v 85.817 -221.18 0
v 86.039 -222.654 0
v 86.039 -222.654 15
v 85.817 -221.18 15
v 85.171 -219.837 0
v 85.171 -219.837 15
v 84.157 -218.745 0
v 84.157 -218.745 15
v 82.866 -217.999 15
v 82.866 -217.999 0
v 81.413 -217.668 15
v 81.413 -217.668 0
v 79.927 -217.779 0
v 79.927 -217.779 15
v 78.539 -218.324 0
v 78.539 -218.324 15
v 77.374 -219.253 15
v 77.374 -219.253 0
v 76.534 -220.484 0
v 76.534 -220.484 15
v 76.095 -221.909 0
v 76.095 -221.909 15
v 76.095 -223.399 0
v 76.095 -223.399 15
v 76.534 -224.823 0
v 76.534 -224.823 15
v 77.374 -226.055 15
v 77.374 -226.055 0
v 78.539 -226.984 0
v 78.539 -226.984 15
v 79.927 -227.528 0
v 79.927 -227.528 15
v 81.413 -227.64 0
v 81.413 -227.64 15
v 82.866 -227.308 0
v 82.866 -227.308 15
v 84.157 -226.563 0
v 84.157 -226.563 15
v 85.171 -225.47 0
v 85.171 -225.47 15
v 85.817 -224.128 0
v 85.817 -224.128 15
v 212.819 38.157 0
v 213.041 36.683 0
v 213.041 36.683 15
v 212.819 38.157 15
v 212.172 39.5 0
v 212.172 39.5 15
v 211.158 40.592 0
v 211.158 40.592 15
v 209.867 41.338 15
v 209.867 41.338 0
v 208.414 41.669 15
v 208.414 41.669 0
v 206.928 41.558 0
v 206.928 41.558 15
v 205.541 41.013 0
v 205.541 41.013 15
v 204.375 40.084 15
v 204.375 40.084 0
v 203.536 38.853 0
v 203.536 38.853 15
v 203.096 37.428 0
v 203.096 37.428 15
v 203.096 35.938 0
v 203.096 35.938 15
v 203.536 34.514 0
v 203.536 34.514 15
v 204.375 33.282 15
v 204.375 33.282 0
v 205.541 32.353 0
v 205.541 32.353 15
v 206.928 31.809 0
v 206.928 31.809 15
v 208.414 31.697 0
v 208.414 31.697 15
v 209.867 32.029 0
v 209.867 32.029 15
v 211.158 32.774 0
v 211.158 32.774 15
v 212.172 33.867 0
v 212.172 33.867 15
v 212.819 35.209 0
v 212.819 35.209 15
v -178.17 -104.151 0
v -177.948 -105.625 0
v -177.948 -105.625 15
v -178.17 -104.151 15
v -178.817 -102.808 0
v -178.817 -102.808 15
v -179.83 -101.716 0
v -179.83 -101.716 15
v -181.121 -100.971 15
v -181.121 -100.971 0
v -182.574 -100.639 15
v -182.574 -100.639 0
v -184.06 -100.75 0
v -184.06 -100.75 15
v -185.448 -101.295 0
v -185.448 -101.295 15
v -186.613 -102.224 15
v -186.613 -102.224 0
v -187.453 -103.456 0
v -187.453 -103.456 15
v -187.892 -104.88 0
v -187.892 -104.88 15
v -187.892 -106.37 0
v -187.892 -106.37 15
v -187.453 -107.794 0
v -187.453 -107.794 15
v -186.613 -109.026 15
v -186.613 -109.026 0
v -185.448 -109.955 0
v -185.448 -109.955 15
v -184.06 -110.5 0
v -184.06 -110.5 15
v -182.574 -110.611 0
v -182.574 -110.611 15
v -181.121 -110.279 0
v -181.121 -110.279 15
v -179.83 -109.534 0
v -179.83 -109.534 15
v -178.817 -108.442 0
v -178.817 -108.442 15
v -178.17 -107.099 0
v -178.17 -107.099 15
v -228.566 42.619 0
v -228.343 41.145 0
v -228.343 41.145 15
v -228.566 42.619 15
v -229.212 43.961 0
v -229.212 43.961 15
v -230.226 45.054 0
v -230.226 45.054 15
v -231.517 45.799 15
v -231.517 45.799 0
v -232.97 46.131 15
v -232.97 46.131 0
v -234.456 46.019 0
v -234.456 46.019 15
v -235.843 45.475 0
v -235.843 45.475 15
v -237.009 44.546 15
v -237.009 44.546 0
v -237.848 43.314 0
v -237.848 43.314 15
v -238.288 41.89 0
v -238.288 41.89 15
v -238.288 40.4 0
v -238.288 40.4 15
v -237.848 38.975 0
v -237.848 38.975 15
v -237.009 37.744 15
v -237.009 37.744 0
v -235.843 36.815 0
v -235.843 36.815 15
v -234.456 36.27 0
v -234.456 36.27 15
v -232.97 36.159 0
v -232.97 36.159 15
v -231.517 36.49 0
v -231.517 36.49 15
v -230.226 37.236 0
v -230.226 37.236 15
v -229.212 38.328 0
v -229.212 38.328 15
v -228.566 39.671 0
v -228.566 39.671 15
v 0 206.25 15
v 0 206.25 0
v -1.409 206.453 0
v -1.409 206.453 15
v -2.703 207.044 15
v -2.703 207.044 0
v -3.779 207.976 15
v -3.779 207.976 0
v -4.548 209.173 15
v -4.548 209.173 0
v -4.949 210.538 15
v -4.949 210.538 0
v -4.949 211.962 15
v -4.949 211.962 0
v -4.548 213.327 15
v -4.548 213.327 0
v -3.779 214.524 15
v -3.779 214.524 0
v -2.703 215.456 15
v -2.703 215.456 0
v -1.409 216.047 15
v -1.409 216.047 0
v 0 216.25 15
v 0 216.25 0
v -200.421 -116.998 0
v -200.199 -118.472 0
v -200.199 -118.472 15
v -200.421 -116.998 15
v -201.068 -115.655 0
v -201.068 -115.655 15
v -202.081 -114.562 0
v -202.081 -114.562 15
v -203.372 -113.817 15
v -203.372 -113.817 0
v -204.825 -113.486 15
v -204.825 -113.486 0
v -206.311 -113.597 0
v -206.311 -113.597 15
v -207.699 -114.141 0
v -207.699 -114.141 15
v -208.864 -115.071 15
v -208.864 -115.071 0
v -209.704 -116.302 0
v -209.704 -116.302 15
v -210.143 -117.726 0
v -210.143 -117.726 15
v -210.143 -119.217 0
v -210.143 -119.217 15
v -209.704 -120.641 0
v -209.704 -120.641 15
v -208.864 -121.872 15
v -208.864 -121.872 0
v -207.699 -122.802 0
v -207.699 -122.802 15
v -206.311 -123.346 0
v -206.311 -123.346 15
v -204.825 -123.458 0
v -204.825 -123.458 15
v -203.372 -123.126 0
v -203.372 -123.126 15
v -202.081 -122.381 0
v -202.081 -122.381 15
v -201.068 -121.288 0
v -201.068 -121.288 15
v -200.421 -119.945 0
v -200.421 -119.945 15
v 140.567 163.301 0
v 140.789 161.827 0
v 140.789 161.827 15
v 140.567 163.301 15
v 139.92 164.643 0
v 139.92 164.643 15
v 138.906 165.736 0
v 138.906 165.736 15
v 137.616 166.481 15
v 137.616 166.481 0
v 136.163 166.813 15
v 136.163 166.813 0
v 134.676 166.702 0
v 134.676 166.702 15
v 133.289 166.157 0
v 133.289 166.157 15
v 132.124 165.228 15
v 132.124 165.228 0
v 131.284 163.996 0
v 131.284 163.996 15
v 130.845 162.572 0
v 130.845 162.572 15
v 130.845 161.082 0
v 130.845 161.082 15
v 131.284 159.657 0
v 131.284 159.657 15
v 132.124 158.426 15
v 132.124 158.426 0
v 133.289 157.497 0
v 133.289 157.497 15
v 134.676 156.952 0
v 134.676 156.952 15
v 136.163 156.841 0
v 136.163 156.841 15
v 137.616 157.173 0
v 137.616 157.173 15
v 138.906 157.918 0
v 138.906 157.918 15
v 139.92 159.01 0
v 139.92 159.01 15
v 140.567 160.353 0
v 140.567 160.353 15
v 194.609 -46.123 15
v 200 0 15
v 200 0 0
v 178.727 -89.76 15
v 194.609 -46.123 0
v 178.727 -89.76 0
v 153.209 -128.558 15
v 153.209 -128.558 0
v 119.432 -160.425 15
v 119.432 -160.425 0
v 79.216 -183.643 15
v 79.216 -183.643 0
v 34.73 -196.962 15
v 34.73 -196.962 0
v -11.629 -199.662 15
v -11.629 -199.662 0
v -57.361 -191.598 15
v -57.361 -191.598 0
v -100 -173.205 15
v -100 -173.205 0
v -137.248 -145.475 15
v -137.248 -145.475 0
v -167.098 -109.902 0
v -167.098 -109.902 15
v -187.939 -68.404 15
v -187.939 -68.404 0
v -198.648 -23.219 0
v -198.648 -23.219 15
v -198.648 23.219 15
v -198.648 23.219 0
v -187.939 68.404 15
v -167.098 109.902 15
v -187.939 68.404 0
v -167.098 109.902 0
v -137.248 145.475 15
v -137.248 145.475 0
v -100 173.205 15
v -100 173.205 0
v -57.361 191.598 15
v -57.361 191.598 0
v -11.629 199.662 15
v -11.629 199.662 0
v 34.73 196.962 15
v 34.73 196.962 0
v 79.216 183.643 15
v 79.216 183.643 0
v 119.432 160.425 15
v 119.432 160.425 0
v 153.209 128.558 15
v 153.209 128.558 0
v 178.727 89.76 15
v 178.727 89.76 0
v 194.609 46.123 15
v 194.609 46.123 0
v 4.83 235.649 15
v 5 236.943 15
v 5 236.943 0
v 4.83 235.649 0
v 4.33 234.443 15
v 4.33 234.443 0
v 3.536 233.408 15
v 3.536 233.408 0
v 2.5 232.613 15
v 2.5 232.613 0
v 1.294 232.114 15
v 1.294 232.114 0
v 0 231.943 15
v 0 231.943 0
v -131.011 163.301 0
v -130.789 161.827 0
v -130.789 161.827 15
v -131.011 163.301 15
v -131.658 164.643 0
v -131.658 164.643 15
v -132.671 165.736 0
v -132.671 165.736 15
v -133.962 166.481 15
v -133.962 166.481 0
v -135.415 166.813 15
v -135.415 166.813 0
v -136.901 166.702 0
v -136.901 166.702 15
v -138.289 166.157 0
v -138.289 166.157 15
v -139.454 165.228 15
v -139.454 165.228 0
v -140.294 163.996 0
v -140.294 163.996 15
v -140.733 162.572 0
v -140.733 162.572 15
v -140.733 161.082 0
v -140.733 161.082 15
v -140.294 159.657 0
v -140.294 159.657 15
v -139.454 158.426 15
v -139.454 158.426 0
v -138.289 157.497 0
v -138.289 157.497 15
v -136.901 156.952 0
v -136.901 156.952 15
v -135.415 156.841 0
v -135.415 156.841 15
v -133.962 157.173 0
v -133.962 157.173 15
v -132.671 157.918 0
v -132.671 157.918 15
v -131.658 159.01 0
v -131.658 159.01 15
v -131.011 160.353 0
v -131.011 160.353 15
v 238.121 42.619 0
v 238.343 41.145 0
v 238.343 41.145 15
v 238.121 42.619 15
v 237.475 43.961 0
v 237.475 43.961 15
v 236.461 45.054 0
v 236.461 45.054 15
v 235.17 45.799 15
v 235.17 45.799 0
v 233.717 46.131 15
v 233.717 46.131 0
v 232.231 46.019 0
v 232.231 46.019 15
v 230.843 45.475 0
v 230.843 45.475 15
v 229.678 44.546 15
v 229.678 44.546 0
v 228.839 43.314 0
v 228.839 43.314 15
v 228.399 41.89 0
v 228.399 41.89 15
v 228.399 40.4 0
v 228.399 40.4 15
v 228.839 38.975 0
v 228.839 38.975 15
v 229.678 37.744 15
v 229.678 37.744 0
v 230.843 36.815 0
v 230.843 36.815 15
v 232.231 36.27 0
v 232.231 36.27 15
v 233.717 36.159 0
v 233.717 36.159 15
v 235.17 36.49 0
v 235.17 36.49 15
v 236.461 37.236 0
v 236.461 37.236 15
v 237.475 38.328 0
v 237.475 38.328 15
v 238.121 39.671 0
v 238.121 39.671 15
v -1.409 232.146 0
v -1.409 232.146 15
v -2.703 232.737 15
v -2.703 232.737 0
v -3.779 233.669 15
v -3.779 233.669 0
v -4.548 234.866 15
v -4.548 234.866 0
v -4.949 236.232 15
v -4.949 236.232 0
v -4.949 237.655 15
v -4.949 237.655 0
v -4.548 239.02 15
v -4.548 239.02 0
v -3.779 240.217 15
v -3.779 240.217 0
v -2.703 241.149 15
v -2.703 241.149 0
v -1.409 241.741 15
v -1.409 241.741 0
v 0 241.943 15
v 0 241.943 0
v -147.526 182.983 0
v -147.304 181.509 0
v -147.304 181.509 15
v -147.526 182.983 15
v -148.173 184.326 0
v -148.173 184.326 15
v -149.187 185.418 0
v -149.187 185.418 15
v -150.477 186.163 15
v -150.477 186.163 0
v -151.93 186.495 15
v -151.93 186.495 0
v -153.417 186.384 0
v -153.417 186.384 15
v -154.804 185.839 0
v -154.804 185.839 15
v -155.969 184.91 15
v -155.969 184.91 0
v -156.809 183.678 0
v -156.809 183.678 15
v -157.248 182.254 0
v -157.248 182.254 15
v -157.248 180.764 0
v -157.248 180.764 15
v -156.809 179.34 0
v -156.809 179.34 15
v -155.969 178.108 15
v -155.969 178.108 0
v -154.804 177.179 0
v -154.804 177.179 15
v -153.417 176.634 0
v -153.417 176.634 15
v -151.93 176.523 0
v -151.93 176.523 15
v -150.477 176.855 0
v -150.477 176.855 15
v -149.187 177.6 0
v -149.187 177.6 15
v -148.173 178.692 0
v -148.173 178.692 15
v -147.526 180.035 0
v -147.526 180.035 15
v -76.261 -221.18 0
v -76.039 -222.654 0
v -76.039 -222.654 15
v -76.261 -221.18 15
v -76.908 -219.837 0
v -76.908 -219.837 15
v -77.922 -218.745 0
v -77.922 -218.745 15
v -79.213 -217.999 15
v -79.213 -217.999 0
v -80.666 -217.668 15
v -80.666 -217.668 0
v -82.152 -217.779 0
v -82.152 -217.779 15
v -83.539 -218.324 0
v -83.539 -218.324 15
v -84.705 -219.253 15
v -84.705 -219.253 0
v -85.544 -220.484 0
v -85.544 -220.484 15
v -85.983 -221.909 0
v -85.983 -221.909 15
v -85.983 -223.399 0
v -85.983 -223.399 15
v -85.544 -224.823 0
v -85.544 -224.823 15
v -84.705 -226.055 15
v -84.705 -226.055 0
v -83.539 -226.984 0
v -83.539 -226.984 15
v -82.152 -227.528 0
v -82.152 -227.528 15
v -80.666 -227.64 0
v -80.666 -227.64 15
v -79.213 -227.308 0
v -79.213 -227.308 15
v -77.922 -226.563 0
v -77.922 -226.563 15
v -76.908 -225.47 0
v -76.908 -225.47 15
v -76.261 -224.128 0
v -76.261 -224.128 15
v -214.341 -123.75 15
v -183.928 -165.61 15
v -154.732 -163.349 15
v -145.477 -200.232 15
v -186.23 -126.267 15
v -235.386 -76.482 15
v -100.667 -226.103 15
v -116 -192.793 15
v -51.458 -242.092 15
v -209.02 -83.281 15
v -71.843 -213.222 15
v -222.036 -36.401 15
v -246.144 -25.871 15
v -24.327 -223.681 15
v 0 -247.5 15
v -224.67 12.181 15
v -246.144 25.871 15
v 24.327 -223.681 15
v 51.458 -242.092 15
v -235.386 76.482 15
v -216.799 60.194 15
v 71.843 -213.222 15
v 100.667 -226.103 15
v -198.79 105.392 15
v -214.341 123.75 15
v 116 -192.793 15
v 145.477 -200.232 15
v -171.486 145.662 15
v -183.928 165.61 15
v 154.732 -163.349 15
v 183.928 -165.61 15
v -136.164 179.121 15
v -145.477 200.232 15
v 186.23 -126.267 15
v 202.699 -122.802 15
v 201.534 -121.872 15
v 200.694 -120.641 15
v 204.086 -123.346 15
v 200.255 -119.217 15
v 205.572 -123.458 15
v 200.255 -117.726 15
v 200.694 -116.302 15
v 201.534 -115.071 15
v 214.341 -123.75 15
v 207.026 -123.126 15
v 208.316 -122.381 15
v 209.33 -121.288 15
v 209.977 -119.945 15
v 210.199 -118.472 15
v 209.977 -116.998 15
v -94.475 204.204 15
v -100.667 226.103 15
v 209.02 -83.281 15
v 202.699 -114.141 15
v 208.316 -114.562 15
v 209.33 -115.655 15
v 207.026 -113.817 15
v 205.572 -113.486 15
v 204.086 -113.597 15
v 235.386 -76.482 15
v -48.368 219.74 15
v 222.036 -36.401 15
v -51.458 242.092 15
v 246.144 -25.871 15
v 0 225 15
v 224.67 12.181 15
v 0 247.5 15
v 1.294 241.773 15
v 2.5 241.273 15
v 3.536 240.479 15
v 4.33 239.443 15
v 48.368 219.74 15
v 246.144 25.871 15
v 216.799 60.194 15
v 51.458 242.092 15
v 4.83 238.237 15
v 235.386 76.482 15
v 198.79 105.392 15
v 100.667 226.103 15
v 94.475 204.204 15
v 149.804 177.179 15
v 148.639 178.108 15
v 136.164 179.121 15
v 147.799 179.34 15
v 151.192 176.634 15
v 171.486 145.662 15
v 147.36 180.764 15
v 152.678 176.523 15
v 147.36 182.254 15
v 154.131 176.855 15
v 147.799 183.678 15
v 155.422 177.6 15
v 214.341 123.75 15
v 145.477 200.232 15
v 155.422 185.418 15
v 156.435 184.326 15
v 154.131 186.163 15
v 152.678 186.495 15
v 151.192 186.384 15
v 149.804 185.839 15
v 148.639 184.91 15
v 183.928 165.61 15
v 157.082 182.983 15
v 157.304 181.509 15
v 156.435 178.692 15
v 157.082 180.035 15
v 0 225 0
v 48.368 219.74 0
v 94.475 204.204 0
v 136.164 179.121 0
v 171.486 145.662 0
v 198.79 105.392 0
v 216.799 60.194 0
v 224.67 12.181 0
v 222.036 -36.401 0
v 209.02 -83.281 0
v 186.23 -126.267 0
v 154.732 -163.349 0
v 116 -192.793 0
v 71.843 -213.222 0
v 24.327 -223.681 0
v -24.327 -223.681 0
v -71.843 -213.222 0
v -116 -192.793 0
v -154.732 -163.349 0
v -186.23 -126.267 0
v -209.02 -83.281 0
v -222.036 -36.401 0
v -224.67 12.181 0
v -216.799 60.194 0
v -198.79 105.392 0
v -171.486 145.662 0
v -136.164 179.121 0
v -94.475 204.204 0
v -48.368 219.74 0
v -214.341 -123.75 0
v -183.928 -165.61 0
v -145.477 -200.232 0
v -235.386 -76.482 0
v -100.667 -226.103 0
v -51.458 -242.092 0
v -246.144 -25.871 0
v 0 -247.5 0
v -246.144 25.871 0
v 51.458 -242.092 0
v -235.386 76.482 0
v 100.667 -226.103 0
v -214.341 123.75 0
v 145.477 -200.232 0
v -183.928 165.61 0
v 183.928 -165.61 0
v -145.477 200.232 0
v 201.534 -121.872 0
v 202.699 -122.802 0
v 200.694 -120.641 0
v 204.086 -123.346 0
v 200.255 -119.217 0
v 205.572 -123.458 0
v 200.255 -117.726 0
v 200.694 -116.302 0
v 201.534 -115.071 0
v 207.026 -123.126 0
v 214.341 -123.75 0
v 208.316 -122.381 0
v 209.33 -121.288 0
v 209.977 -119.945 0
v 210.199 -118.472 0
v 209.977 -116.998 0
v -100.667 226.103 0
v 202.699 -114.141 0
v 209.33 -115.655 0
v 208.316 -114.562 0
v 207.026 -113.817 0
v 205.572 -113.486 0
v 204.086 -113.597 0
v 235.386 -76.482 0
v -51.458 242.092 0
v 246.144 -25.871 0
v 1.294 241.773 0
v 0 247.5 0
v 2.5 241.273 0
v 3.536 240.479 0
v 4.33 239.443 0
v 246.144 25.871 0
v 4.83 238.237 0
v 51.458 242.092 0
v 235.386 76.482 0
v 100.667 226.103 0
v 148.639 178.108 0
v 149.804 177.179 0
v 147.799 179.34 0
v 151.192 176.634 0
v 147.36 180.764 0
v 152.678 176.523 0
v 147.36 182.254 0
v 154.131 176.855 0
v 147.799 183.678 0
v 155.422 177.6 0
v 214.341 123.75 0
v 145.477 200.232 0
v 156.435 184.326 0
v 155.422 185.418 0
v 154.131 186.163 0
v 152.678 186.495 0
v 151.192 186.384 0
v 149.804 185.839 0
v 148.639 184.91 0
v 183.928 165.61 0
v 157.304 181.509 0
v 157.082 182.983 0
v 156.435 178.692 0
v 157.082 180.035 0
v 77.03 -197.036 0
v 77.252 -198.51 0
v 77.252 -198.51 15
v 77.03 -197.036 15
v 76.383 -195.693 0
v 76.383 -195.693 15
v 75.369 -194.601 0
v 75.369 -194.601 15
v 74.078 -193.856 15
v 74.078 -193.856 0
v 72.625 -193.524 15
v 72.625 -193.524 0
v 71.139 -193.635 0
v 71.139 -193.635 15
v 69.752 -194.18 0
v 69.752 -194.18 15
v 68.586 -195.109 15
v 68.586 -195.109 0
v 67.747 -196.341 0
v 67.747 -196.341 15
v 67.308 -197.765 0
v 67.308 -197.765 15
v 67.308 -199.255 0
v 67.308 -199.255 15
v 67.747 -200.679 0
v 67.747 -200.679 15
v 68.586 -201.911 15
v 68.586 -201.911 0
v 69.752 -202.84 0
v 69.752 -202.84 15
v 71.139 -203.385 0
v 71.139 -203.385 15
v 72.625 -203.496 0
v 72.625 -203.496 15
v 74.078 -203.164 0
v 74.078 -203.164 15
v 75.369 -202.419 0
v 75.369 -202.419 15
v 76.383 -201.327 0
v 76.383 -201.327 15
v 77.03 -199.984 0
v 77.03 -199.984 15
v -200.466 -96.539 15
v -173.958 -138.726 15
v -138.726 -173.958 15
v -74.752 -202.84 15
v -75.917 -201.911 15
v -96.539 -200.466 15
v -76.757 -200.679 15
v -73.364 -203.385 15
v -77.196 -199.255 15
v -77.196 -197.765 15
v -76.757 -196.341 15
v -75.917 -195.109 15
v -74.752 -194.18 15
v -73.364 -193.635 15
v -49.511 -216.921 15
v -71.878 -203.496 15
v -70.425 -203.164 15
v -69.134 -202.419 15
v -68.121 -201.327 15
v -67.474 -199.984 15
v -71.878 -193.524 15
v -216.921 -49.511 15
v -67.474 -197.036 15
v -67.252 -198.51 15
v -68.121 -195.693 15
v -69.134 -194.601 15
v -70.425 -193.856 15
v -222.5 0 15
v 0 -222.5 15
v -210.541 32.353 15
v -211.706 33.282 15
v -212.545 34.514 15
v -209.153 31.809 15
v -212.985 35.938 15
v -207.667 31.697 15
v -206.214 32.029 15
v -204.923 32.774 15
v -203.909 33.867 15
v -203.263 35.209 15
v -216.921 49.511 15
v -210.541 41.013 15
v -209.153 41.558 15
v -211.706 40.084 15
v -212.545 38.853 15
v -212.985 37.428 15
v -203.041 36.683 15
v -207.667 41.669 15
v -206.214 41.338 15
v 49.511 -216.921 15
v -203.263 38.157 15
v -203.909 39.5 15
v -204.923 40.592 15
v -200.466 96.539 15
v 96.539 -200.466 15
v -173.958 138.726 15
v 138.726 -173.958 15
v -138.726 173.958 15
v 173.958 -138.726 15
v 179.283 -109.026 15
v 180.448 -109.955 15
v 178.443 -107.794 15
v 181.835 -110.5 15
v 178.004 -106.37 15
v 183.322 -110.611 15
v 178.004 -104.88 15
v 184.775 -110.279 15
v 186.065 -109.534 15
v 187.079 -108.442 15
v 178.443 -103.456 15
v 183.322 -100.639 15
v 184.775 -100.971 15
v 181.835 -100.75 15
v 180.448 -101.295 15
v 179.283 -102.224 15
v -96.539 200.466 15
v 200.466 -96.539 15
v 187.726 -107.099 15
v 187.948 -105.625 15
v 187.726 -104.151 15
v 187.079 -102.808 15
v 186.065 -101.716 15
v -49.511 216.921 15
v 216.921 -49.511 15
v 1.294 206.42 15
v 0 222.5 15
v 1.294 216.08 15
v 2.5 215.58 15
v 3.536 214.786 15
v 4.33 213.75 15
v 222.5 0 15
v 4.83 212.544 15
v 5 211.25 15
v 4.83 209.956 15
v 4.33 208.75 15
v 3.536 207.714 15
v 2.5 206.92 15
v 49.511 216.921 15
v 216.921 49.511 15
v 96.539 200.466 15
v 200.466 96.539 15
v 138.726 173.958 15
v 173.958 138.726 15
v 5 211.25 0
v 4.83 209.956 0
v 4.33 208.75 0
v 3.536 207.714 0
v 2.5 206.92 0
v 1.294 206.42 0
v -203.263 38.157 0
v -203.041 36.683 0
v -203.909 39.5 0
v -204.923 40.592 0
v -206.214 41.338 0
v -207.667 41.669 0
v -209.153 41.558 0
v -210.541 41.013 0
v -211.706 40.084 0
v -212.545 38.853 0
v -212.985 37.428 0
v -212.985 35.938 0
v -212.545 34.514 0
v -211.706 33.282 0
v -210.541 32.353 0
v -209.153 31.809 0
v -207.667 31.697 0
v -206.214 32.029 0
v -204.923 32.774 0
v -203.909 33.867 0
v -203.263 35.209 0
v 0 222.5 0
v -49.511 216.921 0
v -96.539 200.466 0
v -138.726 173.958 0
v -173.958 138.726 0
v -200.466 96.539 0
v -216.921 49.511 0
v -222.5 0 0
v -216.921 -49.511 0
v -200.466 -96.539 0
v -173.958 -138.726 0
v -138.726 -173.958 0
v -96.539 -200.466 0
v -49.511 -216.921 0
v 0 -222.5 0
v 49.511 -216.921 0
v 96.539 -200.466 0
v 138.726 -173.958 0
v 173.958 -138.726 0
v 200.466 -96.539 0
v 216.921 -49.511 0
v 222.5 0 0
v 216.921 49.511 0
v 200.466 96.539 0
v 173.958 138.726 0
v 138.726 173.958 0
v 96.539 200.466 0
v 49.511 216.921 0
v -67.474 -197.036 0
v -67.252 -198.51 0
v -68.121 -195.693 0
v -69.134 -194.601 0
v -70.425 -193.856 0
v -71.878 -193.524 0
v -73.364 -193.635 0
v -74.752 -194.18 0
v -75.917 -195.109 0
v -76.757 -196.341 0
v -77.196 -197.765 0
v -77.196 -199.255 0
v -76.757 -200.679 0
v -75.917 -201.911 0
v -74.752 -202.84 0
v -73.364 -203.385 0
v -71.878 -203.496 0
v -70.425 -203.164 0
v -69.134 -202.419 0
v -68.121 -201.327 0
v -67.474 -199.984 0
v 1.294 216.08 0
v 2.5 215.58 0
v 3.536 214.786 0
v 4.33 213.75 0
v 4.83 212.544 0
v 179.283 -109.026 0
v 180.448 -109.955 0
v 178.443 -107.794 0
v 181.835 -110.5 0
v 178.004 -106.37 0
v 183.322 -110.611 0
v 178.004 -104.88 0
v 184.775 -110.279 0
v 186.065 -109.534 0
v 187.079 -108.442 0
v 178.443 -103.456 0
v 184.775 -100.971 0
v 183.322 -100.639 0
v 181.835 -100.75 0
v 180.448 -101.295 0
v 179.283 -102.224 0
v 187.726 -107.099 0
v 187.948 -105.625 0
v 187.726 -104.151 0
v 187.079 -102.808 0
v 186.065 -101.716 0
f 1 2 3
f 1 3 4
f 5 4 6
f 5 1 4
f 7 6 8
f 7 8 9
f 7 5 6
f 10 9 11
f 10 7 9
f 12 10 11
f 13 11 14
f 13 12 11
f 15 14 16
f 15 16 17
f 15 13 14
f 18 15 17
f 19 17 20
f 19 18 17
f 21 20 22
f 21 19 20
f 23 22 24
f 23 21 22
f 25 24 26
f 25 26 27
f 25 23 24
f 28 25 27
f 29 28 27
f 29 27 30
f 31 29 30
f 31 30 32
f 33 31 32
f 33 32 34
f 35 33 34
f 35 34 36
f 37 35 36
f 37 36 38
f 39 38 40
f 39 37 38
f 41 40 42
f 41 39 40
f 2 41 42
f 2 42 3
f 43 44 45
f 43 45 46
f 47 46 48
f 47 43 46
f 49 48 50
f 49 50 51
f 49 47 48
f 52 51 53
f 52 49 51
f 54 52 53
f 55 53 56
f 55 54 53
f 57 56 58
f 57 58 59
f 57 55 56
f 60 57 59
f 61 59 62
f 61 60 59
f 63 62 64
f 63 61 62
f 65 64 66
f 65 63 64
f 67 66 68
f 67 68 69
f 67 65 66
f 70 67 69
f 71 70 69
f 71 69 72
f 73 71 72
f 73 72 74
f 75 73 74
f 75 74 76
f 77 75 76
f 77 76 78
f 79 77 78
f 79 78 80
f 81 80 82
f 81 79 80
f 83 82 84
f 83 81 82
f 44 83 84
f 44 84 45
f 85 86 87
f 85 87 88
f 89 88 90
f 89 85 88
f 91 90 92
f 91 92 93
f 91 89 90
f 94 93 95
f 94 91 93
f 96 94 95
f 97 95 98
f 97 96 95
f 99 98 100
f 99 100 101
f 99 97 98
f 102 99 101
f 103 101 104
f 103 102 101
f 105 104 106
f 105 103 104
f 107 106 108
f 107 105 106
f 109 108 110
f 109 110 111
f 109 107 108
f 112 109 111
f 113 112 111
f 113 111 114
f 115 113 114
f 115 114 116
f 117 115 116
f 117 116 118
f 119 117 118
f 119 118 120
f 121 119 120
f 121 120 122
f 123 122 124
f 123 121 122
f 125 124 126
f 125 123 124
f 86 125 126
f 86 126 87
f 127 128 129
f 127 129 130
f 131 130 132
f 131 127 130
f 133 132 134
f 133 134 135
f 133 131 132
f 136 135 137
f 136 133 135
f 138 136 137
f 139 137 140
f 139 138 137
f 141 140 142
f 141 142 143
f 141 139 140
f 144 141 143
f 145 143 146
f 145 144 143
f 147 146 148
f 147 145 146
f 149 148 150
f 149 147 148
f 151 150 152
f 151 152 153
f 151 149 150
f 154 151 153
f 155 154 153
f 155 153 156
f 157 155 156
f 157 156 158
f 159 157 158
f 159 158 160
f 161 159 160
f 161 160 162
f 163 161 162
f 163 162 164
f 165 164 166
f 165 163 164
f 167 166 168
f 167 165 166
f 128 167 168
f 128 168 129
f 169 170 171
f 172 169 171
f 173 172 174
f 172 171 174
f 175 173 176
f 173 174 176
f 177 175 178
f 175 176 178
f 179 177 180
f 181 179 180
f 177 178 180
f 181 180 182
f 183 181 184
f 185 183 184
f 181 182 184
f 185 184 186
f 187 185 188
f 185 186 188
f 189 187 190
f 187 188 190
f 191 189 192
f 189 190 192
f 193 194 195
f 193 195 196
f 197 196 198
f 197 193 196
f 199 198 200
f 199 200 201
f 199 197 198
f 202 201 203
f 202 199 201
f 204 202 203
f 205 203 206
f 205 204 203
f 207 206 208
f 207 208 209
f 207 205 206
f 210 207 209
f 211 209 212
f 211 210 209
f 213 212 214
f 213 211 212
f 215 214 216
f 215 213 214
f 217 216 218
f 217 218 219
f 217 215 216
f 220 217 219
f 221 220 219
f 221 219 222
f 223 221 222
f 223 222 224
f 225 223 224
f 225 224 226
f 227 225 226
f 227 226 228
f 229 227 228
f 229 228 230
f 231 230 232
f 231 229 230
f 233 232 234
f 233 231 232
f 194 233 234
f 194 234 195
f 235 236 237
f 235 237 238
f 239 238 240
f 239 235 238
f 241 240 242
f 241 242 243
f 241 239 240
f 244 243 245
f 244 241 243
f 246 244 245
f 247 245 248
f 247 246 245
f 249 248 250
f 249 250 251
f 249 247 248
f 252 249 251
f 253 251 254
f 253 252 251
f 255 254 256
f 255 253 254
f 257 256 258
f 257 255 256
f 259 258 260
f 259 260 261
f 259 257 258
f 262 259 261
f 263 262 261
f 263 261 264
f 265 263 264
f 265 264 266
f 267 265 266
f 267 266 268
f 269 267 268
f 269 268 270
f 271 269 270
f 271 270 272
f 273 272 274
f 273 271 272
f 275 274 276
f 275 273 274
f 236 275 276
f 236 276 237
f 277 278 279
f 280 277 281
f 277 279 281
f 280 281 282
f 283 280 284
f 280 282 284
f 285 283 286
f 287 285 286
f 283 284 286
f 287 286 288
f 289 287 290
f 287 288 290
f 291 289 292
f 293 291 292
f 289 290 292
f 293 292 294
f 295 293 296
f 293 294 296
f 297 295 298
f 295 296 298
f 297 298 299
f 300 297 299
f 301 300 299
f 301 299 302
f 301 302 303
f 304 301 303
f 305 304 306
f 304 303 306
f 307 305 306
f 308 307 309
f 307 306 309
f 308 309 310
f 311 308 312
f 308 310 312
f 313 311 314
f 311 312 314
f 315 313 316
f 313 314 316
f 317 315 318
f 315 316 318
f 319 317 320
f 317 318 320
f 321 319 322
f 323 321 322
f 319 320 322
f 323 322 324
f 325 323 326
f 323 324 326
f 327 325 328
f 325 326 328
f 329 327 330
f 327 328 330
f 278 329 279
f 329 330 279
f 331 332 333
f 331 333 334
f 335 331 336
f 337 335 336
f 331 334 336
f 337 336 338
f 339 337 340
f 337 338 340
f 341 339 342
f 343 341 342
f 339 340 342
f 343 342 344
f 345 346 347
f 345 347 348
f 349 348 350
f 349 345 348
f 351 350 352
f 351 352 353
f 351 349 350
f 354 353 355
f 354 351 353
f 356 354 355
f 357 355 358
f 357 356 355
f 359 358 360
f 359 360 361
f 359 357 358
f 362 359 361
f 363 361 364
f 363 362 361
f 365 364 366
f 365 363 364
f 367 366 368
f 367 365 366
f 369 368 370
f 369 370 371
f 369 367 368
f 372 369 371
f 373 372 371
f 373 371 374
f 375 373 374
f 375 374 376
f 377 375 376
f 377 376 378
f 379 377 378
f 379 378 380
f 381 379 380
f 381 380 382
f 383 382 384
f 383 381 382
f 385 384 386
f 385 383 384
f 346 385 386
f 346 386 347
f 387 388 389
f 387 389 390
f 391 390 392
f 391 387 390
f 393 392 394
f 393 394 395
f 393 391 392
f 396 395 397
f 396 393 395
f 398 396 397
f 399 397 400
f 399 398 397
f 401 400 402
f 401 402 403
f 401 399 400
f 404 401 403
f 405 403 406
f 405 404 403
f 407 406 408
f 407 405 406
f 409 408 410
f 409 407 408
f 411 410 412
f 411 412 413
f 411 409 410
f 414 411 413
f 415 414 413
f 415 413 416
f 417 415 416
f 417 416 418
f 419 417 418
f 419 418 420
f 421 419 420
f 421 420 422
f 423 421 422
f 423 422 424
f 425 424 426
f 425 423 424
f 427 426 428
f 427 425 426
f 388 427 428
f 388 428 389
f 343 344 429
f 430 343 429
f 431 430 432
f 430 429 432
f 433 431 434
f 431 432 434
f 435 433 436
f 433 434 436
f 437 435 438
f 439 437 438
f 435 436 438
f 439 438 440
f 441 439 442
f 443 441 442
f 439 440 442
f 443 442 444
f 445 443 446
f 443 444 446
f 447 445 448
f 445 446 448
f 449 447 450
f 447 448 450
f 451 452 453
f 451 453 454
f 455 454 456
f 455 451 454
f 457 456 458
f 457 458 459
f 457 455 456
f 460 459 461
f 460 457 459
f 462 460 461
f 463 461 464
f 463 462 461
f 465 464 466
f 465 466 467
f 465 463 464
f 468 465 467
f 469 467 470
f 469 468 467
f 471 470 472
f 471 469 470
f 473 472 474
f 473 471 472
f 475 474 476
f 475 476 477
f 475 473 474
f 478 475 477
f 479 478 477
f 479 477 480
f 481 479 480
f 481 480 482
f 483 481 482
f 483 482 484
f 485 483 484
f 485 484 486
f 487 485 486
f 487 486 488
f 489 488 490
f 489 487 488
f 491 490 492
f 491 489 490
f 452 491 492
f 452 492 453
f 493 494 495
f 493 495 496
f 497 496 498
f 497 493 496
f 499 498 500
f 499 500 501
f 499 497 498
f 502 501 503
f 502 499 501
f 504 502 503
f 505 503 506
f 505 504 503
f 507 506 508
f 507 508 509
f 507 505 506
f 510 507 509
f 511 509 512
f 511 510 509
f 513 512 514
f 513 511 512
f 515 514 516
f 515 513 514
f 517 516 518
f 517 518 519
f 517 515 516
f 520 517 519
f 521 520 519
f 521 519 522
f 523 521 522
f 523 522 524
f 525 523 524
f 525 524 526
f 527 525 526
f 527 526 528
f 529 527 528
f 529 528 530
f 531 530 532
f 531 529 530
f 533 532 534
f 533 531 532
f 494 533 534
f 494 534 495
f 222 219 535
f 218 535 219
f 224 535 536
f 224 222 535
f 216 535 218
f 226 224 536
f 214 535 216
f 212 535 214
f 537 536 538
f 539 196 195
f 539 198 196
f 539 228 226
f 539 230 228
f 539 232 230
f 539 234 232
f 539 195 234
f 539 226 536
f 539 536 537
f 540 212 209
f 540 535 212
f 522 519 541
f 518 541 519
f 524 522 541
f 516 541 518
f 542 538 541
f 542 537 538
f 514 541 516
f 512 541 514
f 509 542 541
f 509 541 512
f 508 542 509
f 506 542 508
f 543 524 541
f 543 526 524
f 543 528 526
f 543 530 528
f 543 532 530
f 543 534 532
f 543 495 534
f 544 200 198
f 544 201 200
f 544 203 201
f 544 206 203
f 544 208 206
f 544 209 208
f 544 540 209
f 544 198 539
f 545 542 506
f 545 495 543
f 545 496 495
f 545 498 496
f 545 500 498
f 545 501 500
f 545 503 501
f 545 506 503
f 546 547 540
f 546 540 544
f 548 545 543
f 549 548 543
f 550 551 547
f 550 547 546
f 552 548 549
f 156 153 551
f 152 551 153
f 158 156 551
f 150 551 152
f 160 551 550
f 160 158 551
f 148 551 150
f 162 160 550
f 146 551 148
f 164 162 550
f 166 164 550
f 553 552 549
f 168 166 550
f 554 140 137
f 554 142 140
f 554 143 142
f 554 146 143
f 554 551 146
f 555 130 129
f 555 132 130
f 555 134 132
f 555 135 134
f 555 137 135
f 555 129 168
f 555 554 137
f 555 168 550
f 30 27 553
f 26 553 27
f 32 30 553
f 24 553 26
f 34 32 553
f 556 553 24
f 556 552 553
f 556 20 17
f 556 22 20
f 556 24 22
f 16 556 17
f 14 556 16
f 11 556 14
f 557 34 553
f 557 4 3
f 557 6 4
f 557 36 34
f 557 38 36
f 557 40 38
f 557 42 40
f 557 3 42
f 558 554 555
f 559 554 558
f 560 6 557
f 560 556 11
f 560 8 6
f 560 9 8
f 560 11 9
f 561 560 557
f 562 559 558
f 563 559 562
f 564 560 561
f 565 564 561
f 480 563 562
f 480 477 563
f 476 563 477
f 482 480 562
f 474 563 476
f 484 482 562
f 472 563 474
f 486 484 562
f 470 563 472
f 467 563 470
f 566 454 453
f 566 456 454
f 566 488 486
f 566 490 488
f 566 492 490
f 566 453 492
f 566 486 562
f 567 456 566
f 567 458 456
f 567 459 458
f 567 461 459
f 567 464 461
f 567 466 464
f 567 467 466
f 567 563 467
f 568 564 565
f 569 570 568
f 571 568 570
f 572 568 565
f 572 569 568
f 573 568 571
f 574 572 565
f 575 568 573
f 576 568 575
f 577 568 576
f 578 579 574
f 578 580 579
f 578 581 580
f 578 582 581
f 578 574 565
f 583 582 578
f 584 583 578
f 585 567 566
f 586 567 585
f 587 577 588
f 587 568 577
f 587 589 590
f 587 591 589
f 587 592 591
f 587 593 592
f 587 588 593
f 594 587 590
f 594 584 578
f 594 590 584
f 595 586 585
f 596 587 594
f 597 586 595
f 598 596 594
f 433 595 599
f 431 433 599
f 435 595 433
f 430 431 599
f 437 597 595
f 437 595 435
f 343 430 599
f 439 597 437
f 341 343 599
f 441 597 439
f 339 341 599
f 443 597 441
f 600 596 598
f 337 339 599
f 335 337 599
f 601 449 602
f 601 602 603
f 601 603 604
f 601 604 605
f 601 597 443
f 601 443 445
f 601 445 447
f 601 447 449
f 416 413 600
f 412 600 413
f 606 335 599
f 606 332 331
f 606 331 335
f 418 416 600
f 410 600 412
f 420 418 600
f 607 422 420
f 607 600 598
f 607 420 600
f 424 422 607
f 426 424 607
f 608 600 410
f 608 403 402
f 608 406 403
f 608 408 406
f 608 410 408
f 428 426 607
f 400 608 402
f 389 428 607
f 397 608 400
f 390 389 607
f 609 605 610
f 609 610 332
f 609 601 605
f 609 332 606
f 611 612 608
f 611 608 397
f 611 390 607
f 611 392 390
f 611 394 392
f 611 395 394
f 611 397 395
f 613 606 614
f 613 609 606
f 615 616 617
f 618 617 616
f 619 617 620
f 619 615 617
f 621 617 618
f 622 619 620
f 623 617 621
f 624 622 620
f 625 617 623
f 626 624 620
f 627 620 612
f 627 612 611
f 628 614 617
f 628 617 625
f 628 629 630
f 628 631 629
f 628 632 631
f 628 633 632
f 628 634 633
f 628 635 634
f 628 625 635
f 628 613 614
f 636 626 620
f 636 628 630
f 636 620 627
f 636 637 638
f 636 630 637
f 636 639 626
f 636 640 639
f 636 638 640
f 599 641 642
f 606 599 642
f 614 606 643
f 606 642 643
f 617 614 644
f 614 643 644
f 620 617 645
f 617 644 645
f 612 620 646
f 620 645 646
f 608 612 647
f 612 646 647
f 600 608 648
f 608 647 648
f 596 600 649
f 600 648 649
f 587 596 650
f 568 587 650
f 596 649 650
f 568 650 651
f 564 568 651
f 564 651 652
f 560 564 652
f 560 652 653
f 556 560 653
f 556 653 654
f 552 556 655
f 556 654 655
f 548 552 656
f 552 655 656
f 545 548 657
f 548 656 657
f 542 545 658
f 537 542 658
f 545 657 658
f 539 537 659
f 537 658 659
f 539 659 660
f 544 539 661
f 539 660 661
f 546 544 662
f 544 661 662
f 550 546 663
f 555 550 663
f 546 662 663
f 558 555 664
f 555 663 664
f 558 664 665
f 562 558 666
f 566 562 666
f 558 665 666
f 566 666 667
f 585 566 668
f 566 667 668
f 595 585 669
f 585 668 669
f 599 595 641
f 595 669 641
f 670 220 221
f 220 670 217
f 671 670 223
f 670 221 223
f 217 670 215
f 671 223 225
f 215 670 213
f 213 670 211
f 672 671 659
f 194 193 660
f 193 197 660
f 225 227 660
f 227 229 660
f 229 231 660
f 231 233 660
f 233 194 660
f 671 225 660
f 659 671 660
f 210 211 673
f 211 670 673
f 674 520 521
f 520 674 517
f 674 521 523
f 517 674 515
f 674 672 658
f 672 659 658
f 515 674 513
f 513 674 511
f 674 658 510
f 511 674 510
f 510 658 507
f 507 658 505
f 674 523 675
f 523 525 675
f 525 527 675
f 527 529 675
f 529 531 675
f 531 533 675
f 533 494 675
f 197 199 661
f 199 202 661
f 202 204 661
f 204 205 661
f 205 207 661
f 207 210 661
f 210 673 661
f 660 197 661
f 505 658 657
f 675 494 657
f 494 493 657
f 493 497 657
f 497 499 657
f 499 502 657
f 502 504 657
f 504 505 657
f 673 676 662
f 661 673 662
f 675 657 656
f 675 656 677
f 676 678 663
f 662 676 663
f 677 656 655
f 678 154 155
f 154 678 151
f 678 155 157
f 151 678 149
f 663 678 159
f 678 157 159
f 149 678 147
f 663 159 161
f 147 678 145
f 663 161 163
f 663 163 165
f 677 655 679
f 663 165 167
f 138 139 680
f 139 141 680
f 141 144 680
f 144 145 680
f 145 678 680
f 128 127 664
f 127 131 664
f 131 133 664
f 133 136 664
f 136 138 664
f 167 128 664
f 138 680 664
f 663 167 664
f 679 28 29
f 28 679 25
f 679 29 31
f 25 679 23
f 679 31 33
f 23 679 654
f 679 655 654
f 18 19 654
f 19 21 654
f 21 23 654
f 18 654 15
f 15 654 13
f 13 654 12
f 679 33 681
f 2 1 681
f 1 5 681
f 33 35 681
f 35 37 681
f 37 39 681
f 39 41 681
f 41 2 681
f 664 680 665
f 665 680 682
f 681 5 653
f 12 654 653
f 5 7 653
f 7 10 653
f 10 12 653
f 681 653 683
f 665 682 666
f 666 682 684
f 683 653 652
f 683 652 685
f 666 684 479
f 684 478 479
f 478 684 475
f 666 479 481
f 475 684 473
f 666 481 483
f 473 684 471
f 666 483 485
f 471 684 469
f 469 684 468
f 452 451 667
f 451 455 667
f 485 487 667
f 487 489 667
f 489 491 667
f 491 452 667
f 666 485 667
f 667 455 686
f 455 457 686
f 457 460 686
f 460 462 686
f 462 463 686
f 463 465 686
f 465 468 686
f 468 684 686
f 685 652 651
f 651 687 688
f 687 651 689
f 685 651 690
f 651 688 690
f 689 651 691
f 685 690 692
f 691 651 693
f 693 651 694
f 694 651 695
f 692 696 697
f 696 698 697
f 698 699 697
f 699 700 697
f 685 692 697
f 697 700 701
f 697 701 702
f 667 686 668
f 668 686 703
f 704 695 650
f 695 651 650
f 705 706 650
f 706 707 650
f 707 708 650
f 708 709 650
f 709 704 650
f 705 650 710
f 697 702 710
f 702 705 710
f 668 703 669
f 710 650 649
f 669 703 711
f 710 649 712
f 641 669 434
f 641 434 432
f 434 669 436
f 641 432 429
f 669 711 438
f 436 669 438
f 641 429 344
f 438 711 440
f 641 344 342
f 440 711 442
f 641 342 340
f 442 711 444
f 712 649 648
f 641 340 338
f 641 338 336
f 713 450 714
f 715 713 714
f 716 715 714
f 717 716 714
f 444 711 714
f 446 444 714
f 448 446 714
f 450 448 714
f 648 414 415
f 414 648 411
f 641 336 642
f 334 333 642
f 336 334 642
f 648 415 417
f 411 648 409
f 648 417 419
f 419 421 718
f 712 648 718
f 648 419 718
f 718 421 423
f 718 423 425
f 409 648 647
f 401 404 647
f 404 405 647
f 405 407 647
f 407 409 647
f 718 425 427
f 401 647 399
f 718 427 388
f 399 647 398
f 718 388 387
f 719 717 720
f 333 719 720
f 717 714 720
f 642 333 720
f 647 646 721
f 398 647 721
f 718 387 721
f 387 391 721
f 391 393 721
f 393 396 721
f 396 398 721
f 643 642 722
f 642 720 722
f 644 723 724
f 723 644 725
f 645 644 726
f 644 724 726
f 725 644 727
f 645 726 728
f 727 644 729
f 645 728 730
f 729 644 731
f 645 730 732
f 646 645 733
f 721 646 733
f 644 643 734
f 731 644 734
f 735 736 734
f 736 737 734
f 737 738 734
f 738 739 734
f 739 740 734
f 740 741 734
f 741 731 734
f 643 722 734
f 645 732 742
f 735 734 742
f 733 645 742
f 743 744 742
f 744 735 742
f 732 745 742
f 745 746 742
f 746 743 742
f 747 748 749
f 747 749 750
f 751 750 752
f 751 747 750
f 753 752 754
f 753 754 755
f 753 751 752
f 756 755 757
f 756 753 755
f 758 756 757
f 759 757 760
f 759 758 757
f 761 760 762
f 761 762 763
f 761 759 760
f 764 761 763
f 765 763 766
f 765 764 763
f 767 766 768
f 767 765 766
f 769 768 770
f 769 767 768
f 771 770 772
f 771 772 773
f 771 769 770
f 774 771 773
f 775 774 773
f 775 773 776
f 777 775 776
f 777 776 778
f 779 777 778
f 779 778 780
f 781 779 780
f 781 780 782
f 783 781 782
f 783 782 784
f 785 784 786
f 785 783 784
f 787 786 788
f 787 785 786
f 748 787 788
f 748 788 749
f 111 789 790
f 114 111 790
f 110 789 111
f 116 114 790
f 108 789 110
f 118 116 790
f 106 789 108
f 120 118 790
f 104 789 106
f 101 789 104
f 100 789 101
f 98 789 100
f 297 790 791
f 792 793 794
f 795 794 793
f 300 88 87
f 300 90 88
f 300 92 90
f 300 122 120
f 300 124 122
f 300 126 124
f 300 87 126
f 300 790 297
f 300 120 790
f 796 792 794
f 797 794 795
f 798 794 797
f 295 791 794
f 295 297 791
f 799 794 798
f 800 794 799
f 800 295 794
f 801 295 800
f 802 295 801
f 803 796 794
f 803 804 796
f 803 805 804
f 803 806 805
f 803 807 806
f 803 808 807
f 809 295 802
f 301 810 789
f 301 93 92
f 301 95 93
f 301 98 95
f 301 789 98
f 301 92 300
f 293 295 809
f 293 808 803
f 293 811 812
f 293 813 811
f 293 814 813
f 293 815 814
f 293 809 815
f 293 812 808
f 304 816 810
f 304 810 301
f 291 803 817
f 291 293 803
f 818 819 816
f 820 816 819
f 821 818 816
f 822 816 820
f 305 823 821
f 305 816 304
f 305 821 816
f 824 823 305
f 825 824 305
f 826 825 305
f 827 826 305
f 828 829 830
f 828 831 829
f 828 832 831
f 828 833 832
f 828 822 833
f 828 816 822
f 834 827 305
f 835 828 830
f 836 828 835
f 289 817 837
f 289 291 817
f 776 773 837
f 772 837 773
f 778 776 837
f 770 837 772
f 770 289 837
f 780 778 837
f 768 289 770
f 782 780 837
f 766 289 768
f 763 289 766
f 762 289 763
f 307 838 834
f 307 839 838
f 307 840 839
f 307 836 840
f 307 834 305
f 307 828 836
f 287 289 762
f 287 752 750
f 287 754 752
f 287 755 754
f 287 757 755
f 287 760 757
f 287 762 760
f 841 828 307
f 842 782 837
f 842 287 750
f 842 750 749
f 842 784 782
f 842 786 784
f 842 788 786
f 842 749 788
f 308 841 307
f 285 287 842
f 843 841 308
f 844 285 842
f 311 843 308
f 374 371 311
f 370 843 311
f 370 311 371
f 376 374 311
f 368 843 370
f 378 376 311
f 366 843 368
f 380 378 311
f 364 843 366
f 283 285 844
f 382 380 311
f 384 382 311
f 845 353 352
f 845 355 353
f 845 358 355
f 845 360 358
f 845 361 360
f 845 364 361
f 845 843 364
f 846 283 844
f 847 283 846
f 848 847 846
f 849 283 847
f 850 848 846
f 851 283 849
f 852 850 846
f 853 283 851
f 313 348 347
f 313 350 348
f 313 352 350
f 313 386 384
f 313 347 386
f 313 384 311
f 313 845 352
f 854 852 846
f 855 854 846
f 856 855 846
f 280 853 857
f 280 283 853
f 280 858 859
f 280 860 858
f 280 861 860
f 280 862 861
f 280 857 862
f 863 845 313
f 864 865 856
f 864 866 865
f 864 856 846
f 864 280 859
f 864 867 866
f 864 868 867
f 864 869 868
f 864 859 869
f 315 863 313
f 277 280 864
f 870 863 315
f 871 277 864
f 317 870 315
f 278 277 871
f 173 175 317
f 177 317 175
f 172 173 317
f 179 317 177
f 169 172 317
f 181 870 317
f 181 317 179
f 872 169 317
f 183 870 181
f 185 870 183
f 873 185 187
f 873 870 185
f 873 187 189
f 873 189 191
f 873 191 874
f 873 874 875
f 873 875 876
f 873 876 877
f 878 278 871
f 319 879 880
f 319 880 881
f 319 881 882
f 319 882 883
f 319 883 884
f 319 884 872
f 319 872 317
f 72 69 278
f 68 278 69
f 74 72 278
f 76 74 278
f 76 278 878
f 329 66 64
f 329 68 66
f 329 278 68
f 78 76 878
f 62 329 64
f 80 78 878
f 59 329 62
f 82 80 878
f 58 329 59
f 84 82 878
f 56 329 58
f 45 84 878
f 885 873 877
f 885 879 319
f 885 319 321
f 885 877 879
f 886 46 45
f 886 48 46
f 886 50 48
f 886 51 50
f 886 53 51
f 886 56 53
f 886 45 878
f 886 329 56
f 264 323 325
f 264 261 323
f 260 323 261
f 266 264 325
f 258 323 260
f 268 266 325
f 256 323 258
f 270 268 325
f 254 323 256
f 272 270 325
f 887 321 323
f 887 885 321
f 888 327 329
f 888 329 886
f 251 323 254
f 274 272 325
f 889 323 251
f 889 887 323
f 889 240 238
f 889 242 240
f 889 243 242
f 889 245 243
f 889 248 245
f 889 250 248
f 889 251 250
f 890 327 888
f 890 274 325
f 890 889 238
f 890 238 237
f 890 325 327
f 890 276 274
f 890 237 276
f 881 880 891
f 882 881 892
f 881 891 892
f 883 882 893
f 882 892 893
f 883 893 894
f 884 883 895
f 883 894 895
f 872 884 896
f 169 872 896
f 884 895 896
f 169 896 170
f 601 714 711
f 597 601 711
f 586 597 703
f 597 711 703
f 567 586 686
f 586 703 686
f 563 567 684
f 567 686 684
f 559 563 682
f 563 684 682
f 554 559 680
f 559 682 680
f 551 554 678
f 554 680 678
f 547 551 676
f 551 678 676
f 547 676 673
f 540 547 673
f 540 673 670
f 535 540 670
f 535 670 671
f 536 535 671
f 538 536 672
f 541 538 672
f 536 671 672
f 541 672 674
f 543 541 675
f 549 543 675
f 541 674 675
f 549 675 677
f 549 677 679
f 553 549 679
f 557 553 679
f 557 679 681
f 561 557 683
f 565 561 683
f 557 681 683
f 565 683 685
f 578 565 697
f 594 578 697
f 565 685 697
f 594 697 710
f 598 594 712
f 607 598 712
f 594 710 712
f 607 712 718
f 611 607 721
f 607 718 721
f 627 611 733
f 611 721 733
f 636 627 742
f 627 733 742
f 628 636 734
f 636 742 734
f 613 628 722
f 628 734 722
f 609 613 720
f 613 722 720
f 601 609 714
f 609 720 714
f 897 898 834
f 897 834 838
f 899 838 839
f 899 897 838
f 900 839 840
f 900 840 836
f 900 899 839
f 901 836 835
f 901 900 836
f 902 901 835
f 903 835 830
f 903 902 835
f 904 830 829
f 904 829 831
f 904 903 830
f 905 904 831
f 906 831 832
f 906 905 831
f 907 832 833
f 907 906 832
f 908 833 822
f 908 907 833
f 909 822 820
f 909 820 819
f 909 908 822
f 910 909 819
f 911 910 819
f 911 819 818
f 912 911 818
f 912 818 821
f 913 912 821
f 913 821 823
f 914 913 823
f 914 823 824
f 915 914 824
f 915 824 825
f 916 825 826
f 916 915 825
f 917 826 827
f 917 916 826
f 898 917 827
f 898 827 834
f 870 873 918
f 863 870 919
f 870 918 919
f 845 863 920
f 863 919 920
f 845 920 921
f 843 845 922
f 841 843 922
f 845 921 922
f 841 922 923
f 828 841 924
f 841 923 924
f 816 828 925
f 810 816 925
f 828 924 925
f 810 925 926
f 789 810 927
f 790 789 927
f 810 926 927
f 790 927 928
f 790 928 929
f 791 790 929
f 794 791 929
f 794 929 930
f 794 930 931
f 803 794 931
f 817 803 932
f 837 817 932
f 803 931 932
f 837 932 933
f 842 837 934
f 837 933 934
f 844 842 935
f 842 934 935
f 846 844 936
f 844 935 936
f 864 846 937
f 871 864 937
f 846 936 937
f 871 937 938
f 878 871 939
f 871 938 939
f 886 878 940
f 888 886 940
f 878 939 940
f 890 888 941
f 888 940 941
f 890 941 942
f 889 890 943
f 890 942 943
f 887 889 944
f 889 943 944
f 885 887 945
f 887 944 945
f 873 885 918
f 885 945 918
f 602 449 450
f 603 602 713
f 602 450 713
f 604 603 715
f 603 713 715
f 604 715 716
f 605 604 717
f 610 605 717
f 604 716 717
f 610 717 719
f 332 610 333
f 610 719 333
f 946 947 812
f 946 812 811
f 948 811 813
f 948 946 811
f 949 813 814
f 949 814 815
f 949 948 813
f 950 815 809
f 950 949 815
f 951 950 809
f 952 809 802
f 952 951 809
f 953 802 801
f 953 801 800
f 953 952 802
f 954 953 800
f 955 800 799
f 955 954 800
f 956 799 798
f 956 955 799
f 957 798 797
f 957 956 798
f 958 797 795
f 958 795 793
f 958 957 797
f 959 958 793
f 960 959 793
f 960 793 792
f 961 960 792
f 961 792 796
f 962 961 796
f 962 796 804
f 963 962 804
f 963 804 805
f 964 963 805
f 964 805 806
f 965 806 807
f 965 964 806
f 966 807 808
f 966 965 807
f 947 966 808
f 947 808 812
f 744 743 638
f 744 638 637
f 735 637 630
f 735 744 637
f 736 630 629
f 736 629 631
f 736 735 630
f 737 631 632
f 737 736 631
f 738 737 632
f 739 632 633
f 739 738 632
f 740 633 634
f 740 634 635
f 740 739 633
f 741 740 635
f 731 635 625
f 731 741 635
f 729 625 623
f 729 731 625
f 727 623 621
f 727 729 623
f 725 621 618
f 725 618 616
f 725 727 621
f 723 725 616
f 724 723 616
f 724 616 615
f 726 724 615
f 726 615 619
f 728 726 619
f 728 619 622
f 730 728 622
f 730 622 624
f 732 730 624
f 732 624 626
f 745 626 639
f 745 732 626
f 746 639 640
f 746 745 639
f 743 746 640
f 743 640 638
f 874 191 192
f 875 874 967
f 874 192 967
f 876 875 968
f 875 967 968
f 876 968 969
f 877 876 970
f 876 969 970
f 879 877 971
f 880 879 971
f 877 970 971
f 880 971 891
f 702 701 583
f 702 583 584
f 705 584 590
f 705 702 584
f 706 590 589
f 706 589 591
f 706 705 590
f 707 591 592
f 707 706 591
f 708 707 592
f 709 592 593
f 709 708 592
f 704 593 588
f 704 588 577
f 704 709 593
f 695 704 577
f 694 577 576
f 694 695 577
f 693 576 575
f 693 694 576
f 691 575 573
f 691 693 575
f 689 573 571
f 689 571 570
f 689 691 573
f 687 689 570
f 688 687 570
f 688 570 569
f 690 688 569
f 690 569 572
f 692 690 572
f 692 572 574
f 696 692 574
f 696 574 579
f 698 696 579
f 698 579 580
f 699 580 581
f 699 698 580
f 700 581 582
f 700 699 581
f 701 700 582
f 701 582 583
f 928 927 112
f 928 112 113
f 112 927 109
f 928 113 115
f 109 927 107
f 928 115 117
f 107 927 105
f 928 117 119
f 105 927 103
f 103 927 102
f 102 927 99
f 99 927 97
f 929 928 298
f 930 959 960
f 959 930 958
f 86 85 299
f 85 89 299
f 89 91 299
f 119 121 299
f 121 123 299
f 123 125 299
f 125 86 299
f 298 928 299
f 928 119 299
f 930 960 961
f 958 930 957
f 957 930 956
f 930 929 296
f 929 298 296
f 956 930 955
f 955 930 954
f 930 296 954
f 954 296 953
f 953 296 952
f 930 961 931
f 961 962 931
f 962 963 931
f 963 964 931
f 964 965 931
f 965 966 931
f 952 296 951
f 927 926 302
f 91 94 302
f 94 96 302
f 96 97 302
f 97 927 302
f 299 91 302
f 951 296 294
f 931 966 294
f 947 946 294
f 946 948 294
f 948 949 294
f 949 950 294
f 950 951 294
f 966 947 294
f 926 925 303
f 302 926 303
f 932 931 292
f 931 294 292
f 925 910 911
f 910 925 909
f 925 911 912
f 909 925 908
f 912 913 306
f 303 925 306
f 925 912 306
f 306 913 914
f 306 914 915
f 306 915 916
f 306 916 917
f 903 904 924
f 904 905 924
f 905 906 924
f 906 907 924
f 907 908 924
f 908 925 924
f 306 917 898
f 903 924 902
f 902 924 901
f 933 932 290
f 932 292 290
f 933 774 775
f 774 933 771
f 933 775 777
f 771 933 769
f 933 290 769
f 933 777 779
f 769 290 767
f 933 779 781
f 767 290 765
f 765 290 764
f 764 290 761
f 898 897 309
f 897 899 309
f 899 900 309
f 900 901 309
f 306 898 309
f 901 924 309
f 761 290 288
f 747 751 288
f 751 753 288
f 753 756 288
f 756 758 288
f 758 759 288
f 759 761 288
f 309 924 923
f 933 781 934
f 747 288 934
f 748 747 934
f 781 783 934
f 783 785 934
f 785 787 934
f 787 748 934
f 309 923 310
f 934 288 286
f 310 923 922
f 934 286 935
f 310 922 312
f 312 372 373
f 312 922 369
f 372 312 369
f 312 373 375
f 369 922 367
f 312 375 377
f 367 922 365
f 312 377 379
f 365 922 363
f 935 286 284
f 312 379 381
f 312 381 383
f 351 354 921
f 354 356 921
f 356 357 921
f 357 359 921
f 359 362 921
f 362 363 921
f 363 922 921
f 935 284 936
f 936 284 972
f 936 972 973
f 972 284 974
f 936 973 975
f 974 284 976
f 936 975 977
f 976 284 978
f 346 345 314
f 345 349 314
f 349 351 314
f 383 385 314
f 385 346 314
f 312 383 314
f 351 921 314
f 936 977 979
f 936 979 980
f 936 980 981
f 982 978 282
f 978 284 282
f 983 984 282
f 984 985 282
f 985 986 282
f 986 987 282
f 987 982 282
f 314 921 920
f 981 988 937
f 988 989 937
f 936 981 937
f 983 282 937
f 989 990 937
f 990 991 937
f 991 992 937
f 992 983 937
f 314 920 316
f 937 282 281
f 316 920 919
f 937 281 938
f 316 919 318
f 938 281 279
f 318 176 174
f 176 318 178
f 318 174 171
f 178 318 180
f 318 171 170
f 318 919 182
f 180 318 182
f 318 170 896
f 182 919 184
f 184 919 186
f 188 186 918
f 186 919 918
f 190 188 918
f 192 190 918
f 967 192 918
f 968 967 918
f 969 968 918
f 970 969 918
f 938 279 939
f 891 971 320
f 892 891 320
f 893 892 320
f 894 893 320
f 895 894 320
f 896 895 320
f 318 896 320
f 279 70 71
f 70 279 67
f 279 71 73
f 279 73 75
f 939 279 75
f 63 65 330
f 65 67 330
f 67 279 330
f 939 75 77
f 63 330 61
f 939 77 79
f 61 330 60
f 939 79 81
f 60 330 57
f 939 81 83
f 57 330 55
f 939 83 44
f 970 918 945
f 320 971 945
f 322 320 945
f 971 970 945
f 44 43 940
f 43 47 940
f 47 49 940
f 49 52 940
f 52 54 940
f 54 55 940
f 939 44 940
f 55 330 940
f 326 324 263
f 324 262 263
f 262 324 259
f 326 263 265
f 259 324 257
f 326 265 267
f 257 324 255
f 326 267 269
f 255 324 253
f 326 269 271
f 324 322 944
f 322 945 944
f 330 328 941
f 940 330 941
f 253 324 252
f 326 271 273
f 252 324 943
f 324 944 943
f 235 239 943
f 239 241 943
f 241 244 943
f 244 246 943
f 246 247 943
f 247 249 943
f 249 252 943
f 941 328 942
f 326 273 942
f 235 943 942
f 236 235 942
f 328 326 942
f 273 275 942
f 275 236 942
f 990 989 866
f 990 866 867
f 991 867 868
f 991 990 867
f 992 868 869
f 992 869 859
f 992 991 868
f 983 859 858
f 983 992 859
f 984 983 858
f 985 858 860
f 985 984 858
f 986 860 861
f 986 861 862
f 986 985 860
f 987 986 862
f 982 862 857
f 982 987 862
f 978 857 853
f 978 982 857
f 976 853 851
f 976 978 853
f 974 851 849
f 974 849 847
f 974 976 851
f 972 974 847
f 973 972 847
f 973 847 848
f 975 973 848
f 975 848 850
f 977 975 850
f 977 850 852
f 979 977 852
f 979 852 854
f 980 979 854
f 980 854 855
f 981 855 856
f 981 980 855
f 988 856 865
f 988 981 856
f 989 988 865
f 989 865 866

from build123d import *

# Parameters (mm, degrees)
F0_R     = 5
F1_DEPTH = 15


with BuildPart() as f1:
    # F0 (on Top) → F1 (new body)
    with BuildSketch(Plane.XY):
        with BuildLine():
            ThreePointArc((222.5, 0), (157.331258814, 157.331258814), (0, 222.5))
            ThreePointArc((0, 222.5), (-157.331258814, -157.331258814), (222.5, 0))
        make_face()
        with Locations((-72.2517552775, -198.510066141)):
            Circle(F0_R, mode=Mode.SUBTRACT)
        with Locations((-182.9478665495, -105.625)):
            Circle(F0_R, mode=Mode.SUBTRACT)
        with Locations((72.2517552775, -198.510066141)):
            Circle(F0_R, mode=Mode.SUBTRACT)
        with Locations((182.9478665495, -105.625)):
            Circle(F0_R, mode=Mode.SUBTRACT)
        with Locations((-208.0406378238, 36.6831775321)):
            Circle(F0_R, mode=Mode.SUBTRACT)
        with Locations((-135.7888825463, 161.8268886089)):
            Circle(F0_R, mode=Mode.SUBTRACT)
        with BuildLine():
            ThreePointArc((0, 200), (141.4213562373, 141.4213562373), (200, 0))
            ThreePointArc((200, 0), (-141.4213562373, -141.4213562373), (0, 200))
        make_face(mode=Mode.SUBTRACT)
        with Locations((208.0406378238, 36.6831775321)):
            Circle(F0_R, mode=Mode.SUBTRACT)
        with BuildLine():
            ThreePointArc((5, 211.25), (3.5355339059, 207.7144660941), (0, 206.25))
            ThreePointArc((0, 206.25), (-5, 211.25), (0, 216.25))
            ThreePointArc((0, 216.25), (3.5355339059, 214.7855339059), (5, 211.25))
        make_face(mode=Mode.SUBTRACT)
        with Locations((135.7888825463, 161.8268886089)):
            Circle(F0_R, mode=Mode.SUBTRACT)
    extrude(amount=F1_DEPTH)


with BuildPart() as f1b:
    # F0 (on Top) → F1, piece 2 (new body)
    with BuildSketch(Plane.XY):
        with BuildLine():
            ThreePointArc((247.5, 0), (175.0089283437, 175.0089283437), (0, 247.5))
            ThreePointArc((0, 247.5), (-175.0089283437, -175.0089283437), (247.5, 0))
        make_face()
        with Locations((-81.0393422064, -222.6537627996)):
            Circle(F0_R, mode=Mode.SUBTRACT)
        with Locations((-205.1988177489, -118.4715926647)):
            Circle(F0_R, mode=Mode.SUBTRACT)
        with Locations((81.0393422064, -222.6537627996)):
            Circle(F0_R, mode=Mode.SUBTRACT)
        with Locations((205.1988177489, -118.4715926647)):
            Circle(F0_R, mode=Mode.SUBTRACT)
        with Locations((-233.3434859358, 41.1447523431)):
            Circle(F0_R, mode=Mode.SUBTRACT)
        with Locations((-152.3041437294, 181.5090104565)):
            Circle(F0_R, mode=Mode.SUBTRACT)
        with BuildLine():
            ThreePointArc((225, 0), (-159.099025767, -159.099025767), (0, 225))
            ThreePointArc((0, 225), (159.099025767, 159.099025767), (225, 0))
        make_face(mode=Mode.SUBTRACT)
        with Locations((233.3434859358, 41.1447523431)):
            Circle(F0_R, mode=Mode.SUBTRACT)
        with BuildLine():
            ThreePointArc((5, 236.9431853294), (3.5355339059, 233.4076514235), (0, 231.9431853294))
            ThreePointArc((0, 231.9431853294), (-5, 236.9431853294), (0, 241.9431853294))
            ThreePointArc((0, 241.9431853294), (3.5355339059, 240.4787192354), (5, 236.9431853294))
        make_face(mode=Mode.SUBTRACT)
        with Locations((152.3041437294, 181.5090104565)):
            Circle(F0_R, mode=Mode.SUBTRACT)
    extrude(amount=F1_DEPTH)


solid = Compound([f1.part, f1b.part])
